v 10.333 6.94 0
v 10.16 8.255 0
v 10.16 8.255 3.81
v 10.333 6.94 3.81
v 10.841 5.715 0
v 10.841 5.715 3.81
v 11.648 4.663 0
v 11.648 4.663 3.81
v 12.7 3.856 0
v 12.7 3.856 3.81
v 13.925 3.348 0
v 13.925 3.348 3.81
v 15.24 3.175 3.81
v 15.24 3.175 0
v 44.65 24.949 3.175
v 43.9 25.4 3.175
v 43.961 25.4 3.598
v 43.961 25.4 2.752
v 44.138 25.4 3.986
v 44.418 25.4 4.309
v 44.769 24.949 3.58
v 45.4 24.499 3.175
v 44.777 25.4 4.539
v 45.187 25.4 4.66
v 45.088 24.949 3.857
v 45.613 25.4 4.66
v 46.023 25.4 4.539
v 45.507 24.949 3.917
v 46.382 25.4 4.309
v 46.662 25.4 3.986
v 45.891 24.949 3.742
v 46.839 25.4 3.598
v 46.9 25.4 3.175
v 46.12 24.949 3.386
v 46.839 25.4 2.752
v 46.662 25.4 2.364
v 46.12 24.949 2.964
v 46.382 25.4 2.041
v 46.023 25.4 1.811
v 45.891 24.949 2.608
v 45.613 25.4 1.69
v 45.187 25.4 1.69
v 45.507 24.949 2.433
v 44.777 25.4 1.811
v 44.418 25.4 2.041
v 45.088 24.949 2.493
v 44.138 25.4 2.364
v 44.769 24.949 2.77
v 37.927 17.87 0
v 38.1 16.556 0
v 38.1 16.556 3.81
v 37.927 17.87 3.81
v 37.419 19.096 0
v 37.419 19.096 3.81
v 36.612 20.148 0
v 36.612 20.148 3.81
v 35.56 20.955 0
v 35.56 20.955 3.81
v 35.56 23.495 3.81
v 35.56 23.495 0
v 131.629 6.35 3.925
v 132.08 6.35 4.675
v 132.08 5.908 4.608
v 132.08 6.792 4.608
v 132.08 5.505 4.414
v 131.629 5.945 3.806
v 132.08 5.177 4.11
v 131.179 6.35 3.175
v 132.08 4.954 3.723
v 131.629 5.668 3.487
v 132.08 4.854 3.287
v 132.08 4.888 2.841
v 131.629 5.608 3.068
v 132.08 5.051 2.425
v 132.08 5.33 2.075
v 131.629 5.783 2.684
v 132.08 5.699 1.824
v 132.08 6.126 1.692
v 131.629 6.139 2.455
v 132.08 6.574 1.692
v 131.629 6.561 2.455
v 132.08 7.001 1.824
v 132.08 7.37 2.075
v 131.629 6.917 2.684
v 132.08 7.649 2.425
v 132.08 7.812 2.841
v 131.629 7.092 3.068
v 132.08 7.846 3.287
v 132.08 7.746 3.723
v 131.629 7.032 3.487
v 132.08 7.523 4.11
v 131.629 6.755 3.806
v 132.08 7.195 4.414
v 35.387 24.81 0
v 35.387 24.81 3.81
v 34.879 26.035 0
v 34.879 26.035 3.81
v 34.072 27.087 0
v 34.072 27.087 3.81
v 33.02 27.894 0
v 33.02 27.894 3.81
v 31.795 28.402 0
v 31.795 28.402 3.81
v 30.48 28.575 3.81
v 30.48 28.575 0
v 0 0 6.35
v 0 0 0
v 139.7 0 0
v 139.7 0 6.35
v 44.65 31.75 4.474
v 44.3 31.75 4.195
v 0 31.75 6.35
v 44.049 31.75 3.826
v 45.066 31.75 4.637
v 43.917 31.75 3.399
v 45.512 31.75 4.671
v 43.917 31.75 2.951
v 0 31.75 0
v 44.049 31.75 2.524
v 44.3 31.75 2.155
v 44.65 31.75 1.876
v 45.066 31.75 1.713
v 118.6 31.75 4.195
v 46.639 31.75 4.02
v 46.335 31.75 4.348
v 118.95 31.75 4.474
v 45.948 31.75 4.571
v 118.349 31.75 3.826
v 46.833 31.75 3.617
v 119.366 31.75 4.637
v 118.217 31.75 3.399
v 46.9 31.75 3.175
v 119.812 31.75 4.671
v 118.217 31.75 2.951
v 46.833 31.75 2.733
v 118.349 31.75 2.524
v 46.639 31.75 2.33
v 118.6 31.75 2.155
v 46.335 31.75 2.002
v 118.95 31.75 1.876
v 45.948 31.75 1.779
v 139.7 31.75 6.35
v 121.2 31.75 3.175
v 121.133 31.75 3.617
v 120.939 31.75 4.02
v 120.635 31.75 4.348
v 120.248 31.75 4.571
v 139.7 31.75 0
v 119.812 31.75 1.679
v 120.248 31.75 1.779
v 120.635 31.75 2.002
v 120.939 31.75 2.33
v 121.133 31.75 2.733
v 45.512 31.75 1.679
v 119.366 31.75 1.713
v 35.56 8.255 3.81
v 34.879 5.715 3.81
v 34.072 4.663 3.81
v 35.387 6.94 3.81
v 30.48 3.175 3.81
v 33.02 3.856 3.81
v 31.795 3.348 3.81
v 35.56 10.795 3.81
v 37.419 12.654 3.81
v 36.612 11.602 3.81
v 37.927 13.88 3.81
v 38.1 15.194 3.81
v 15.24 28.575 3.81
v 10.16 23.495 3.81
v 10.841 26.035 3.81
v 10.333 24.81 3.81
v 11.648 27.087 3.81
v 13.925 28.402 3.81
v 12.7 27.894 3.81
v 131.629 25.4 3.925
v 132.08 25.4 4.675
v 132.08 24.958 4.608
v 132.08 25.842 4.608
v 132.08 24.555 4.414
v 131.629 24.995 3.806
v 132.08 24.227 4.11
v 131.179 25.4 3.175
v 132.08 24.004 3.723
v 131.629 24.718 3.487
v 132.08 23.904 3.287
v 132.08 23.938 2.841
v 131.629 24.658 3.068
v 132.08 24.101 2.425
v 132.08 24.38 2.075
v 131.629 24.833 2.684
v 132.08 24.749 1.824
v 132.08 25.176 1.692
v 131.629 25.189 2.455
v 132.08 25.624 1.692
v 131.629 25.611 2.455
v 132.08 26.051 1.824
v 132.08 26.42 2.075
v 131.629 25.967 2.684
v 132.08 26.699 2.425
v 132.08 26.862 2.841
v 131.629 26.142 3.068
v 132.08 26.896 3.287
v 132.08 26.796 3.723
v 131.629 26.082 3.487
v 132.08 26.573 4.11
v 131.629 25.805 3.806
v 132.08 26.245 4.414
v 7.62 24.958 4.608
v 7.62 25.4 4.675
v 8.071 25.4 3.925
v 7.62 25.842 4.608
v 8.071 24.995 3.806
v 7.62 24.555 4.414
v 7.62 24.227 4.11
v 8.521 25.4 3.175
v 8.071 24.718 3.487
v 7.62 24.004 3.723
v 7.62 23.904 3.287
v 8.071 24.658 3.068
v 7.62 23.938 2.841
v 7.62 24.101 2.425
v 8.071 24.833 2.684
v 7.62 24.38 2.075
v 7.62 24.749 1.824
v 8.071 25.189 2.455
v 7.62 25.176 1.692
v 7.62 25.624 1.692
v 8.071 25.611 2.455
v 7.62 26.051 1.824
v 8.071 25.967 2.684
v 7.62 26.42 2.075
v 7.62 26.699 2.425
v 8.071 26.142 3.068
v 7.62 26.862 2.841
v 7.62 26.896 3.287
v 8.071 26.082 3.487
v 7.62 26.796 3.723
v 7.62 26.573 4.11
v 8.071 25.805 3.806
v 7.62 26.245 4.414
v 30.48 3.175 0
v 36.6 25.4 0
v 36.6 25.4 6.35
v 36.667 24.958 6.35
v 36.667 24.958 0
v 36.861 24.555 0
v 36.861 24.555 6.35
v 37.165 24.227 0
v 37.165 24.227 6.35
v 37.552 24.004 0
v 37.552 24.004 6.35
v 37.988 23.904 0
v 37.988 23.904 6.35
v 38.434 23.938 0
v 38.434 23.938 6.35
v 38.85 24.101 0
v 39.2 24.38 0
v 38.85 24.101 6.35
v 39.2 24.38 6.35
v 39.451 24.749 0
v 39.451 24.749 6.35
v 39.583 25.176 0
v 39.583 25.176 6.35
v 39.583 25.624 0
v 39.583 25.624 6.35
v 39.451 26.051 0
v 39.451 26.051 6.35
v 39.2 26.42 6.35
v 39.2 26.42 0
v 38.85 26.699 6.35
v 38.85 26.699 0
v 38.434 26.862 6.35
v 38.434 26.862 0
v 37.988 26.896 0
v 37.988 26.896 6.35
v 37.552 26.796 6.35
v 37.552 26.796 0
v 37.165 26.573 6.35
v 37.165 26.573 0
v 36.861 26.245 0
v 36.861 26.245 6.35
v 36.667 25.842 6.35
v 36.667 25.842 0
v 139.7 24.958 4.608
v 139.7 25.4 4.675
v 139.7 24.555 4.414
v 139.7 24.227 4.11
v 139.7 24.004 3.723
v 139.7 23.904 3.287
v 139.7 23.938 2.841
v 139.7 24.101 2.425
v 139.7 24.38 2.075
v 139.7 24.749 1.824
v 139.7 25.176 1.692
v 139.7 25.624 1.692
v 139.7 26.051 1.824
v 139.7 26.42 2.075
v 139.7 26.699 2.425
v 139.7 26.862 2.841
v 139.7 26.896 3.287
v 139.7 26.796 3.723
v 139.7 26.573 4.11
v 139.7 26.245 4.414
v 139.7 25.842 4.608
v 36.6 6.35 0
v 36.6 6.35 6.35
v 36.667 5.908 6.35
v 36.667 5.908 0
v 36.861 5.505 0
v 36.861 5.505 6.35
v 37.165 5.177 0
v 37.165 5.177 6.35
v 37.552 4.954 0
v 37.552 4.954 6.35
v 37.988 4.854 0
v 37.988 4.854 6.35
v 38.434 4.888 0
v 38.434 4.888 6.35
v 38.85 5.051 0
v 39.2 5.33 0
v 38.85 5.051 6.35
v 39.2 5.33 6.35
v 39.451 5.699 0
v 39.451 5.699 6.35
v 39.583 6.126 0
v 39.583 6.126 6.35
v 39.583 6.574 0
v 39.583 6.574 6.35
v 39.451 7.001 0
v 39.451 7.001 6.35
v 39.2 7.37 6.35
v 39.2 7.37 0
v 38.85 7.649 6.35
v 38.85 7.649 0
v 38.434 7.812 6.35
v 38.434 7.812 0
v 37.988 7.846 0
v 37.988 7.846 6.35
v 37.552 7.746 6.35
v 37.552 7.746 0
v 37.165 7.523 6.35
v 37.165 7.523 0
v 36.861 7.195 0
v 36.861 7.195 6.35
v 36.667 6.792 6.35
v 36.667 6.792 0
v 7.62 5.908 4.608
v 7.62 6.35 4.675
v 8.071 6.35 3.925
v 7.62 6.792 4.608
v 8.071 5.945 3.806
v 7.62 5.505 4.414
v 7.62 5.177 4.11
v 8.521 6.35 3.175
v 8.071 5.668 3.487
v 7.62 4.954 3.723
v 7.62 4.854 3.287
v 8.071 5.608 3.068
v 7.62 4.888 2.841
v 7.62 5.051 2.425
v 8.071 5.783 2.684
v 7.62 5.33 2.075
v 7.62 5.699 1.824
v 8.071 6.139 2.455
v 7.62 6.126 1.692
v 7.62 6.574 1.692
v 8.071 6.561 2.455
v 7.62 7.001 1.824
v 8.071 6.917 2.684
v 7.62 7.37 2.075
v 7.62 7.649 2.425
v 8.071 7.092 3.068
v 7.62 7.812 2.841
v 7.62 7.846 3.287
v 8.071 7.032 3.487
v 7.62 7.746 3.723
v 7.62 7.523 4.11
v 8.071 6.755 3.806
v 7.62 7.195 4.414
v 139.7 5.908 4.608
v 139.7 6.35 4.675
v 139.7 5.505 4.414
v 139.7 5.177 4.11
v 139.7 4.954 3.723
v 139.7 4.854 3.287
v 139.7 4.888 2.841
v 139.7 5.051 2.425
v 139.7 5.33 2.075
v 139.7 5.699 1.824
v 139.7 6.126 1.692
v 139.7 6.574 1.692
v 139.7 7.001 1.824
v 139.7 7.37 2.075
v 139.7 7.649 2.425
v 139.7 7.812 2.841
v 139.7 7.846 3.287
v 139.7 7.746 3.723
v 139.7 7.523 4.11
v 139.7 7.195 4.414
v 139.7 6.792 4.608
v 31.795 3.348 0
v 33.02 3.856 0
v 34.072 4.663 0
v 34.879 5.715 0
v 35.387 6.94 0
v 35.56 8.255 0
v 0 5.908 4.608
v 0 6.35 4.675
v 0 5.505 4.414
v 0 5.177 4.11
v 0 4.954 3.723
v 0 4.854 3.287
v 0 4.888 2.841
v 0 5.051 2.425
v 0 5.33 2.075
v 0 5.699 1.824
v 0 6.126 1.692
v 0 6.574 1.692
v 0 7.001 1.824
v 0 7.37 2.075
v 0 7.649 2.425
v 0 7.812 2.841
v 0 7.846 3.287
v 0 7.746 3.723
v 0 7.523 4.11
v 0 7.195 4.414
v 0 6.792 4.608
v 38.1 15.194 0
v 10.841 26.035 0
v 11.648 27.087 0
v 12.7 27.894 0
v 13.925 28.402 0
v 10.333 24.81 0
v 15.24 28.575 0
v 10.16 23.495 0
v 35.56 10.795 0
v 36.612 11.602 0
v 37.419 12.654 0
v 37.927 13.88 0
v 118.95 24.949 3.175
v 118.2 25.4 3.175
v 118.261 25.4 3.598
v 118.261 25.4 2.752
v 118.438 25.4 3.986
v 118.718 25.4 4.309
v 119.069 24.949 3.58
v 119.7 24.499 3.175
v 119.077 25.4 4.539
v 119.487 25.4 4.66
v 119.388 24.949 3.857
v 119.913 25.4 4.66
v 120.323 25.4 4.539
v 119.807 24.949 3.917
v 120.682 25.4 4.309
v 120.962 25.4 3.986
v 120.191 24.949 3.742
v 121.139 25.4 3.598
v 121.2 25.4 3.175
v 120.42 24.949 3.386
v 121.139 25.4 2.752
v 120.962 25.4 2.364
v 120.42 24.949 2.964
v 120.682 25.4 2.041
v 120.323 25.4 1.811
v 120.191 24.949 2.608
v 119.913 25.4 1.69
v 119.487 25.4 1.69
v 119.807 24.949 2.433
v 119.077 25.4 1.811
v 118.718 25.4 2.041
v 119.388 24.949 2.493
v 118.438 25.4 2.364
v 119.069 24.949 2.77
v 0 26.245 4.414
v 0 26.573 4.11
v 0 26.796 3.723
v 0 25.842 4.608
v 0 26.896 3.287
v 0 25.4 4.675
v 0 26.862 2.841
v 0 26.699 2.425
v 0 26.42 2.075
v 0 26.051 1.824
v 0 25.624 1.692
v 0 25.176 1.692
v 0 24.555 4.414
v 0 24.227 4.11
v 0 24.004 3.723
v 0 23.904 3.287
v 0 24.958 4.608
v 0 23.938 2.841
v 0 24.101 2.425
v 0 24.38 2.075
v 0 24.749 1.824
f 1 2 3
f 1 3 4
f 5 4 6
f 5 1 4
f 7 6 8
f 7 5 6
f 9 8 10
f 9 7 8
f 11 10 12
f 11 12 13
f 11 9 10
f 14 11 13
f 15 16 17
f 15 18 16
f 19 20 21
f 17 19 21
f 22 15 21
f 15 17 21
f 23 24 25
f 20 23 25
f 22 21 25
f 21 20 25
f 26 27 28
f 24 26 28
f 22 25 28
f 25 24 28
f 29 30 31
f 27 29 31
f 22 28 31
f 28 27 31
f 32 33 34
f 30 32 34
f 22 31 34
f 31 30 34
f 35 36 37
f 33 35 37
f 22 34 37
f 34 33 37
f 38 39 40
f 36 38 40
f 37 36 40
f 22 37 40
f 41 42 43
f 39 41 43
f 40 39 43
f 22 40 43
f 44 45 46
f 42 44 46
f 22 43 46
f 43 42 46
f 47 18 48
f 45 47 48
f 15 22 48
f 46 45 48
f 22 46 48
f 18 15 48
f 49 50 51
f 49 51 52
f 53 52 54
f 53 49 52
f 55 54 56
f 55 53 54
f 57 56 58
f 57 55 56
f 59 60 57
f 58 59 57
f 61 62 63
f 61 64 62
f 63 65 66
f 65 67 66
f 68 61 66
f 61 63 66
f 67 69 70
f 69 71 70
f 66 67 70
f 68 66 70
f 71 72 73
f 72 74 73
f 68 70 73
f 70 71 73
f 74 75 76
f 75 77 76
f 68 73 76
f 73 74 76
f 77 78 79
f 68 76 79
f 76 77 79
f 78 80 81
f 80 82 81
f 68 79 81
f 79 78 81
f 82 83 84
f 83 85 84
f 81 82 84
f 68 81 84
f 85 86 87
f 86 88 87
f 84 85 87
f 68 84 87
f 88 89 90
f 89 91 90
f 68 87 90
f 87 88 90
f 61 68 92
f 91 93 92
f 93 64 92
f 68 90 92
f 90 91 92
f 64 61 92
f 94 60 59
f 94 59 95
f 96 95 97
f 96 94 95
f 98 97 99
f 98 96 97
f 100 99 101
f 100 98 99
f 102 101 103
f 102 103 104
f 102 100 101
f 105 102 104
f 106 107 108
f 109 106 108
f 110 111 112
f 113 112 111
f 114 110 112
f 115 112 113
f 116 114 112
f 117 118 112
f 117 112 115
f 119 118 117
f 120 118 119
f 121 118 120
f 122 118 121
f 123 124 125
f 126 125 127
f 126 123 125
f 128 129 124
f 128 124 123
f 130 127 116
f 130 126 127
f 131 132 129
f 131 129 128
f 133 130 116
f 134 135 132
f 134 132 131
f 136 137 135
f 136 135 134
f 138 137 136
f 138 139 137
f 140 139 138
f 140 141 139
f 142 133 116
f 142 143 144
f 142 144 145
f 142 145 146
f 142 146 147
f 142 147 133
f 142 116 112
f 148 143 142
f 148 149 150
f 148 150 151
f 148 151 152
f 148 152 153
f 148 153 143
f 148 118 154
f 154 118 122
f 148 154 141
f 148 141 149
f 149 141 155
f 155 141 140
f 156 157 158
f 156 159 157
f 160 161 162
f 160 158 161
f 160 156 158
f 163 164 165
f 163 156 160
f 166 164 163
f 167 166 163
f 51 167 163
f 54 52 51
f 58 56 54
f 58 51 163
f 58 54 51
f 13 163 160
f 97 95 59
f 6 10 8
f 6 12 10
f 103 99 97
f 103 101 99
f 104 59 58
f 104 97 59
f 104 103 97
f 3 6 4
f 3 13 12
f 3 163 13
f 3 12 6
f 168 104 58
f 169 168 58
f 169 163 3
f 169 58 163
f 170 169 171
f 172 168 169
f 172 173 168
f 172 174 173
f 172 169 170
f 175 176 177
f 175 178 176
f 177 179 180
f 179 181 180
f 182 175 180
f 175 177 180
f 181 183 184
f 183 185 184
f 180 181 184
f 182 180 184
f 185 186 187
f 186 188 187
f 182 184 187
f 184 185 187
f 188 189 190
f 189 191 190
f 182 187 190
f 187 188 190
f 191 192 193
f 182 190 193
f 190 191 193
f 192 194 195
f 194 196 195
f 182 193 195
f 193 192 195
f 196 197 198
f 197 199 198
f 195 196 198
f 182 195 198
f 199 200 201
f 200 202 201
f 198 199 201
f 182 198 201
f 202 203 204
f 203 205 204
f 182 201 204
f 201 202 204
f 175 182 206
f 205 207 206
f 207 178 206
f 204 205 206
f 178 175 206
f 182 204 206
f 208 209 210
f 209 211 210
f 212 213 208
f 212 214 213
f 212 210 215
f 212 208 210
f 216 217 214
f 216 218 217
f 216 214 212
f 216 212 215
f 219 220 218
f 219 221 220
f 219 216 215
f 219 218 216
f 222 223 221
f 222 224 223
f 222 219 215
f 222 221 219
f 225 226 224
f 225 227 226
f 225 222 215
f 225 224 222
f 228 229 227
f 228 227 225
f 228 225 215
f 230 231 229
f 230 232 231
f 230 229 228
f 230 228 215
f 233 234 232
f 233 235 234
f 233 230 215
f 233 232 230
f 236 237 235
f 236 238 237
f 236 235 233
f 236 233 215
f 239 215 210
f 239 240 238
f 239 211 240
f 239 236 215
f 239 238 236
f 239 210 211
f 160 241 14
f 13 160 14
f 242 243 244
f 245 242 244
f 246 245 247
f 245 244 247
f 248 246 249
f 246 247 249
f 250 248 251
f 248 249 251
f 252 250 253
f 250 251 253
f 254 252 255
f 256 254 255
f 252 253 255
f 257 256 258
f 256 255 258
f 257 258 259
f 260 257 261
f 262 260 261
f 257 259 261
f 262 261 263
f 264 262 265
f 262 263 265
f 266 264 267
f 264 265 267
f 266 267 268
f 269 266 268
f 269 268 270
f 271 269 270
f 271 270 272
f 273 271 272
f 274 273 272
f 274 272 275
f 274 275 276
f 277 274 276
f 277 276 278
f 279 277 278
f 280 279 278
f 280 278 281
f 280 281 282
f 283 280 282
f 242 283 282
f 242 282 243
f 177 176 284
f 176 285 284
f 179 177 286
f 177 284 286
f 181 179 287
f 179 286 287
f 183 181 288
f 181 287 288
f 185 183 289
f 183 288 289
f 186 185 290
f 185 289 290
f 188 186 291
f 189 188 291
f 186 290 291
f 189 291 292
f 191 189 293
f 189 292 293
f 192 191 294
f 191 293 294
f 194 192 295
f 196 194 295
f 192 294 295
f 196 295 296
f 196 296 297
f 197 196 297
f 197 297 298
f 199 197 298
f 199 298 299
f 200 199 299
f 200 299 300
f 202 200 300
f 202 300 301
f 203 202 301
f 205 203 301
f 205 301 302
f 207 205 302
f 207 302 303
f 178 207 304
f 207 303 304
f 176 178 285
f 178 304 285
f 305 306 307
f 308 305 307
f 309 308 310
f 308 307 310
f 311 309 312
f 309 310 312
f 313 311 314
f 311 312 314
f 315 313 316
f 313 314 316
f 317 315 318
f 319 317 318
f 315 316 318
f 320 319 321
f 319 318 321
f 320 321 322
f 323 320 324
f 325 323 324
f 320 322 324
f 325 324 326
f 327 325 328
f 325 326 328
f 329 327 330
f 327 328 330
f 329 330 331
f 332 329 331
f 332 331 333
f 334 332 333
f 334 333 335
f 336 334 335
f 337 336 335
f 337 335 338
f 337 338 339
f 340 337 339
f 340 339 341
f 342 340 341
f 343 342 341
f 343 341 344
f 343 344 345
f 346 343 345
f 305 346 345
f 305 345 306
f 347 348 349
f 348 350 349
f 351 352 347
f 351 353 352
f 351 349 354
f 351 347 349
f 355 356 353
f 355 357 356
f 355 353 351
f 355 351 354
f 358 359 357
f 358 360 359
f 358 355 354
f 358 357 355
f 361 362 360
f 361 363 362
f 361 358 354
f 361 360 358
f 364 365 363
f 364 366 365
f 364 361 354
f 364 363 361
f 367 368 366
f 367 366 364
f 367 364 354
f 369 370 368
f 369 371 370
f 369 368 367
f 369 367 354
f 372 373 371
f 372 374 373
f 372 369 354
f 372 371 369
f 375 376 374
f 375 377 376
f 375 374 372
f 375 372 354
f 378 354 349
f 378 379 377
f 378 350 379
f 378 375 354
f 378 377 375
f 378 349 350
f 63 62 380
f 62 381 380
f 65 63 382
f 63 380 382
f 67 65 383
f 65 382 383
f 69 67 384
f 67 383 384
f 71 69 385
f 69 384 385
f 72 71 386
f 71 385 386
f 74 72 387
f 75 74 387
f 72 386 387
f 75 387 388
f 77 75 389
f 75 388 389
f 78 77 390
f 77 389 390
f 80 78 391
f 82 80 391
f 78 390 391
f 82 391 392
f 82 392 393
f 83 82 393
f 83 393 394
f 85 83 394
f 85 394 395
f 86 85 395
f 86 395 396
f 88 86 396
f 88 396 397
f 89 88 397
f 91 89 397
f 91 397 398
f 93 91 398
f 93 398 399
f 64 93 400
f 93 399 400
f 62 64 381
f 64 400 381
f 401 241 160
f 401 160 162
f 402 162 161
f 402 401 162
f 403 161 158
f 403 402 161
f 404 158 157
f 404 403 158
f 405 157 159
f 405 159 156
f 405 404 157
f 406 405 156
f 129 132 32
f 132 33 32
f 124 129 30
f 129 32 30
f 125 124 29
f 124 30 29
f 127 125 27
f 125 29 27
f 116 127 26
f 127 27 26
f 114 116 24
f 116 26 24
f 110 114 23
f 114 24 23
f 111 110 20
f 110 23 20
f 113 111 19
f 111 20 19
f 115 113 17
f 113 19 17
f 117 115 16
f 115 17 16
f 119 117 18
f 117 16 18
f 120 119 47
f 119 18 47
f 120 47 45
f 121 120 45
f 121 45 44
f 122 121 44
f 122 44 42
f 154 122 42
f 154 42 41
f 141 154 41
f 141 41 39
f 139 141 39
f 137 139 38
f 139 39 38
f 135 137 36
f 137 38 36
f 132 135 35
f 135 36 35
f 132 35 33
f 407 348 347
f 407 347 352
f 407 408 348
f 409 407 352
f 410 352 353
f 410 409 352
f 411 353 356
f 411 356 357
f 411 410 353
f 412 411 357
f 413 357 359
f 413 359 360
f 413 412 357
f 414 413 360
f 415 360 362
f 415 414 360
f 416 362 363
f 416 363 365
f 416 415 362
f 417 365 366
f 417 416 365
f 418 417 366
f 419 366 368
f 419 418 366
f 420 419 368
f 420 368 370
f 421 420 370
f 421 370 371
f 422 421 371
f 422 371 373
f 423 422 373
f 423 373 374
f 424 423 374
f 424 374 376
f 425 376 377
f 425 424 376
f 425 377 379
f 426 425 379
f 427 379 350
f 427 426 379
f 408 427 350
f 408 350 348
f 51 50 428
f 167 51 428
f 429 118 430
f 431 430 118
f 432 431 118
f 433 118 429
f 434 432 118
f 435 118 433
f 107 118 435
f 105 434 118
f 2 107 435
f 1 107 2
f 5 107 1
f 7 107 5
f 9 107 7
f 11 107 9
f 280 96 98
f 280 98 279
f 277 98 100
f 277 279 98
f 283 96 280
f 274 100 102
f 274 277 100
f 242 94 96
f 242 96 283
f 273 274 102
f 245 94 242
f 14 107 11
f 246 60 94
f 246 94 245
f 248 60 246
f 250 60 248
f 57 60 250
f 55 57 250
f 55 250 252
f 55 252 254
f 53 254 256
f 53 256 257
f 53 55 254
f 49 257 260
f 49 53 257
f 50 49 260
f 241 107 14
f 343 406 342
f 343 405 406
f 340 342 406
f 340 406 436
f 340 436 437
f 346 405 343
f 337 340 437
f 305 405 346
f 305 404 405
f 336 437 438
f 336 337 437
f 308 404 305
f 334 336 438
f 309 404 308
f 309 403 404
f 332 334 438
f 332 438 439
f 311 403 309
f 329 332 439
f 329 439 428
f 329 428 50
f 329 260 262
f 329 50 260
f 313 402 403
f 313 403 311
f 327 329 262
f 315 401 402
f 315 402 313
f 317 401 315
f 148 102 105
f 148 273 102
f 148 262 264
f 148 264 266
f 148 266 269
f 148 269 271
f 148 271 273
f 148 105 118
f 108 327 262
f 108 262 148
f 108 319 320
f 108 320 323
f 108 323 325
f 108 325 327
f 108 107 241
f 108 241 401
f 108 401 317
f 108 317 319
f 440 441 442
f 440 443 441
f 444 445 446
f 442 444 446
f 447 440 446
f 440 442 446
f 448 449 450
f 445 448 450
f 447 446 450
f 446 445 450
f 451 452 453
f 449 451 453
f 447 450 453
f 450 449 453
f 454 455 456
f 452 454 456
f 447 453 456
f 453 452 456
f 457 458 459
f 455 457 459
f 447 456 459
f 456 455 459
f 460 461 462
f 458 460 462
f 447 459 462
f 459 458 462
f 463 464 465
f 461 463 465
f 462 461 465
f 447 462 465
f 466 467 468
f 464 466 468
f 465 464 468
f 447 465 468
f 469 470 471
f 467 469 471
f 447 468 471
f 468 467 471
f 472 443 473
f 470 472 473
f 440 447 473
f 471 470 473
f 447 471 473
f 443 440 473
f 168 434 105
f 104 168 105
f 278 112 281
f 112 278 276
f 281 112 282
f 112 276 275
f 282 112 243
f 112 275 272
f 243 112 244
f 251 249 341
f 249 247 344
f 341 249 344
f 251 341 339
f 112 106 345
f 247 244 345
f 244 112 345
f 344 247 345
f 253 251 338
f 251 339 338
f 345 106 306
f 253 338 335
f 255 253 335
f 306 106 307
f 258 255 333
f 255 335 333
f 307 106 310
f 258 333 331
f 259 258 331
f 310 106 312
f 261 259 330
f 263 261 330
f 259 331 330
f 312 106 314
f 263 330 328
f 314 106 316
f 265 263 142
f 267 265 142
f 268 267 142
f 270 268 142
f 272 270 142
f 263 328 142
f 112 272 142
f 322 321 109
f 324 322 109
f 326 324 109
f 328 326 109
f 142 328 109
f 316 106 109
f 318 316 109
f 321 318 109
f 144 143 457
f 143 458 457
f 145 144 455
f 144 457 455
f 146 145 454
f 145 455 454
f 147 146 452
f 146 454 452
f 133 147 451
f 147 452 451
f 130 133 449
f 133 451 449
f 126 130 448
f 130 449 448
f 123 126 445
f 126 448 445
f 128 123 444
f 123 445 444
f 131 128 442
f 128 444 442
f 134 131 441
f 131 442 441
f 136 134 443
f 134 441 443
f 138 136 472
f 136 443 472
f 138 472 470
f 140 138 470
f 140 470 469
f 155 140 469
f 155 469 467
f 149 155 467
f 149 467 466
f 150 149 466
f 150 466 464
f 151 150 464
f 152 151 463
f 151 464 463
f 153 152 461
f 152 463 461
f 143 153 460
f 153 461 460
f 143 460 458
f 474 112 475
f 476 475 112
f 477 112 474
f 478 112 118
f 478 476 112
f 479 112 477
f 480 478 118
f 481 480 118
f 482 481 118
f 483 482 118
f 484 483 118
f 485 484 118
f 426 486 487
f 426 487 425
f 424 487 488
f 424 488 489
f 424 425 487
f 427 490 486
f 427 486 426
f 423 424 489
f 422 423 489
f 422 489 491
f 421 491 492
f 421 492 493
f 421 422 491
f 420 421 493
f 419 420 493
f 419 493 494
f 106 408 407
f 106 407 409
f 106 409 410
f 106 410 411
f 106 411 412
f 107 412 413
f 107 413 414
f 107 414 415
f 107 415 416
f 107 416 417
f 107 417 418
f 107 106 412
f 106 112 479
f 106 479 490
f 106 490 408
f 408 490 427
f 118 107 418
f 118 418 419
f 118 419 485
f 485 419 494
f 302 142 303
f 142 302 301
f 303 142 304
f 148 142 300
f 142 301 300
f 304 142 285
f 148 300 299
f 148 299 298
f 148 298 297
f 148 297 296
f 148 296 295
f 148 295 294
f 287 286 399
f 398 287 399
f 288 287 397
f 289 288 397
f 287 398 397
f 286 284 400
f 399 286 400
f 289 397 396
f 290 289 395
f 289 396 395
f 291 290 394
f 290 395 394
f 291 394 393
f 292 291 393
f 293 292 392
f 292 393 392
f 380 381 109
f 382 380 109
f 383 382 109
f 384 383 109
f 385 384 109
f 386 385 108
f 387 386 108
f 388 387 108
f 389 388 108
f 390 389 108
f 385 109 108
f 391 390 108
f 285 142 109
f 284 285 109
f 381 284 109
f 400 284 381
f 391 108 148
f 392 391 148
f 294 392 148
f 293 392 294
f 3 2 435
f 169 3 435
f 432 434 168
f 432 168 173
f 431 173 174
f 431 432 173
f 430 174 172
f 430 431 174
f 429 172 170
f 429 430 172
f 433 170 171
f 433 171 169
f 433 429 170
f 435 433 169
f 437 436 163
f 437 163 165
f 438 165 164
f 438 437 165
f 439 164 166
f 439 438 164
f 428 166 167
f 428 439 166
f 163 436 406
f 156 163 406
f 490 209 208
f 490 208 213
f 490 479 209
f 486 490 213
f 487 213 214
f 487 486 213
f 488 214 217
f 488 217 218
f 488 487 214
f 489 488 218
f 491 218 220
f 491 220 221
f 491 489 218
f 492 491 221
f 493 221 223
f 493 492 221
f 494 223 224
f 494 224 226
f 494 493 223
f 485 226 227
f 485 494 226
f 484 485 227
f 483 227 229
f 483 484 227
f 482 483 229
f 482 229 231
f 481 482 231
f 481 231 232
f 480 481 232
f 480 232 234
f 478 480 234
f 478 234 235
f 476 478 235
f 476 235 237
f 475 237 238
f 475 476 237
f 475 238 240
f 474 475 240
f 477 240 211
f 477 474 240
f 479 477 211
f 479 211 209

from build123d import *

# Parameters (mm, degrees)
TOP_PROFILE_W                  = 139.7
TOP_PROFILE_H                  = 6.35
WALL_MID_DEPTH                 = 31.75
F_3_0MM_DOWEL_HOLE1_D          = 3
MOTOR_INTERFERECNE_DEPTH       = 3.81
FILLET2_R                      = 5.08
F_3_0MM_DOWEL_HOLE2_AT_2_COUNT = 2
F_3_0MM_DOWEL_HOLE2_AT_2_PITCH = 19.05
F_3_0MM_DOWEL_HOLE4_D          = 3
F_3_0MM_DOWEL_HOLE4_DEPTH      = 6.35
F_3_0MM_DOWEL_HOLE4_TIP        = 0.901290929


with BuildPart() as part:
    # top profile → wall mid (new body)
    with BuildSketch(Plane(origin=(0, 0, 0), x_dir=(1, 0, 0), z_dir=(0, 1, 0))):
        with Locations((69.85, -3.175)):
            Rectangle(TOP_PROFILE_W, TOP_PROFILE_H)
    extrude(amount=WALL_MID_DEPTH)

    # Ø3.0mm Dowel Hole1 (through all)
    with Locations(Plane(origin=(0, 0, 0), x_dir=(1, 0, 0), z_dir=(0, 0, -1))):
        with Locations((38.1, -6.35), (38.1, -25.4)):
            Hole(F_3_0MM_DOWEL_HOLE1_D / 2)

    # Sketch8 → motor interferecne (cut)
    with BuildSketch(Plane.XY):
        Polygon((10.16, 28.575), (35.56, 28.575), (35.56, 20.955), (38.1, 20.955), (38.1, 10.795), (35.56, 10.795), (35.56, 3.175), (10.16, 3.175), align=None)
    extrude(amount=MOTOR_INTERFERECNE_DEPTH, mode=Mode.SUBTRACT)

    # Fillet2
    # the kernel refuses this fillet: 5.08 mm, written as the material it adds along each edge
    with BuildSketch(Plane(origin=(10.16, 3.175, 0), x_dir=(1, 0, 0), z_dir=(0, 0, 1)), Plane(origin=(35.56, 3.175, 0), x_dir=(0, 1, 0), z_dir=(0, 0, 1)), Plane(origin=(35.56, 28.575, 0), x_dir=(-1, 0, 0), z_dir=(0, 0, 1))) as fillet2_piece_1:
        with BuildLine():
            CenterArc((FILLET2_R, FILLET2_R), FILLET2_R, 180, 90)
            Line((0, FILLET2_R), (-FILLET2_R * 0.02, FILLET2_R))
            Line((-FILLET2_R * 0.02, FILLET2_R), (-FILLET2_R * 0.02, -FILLET2_R * 0.02))
            Line((-FILLET2_R * 0.02, -FILLET2_R * 0.02), (FILLET2_R, -FILLET2_R * 0.02))
            Line((FILLET2_R, -FILLET2_R * 0.02), (FILLET2_R, 0))
        make_face()
    extrude(amount=3.81)
    with BuildSketch(Plane(origin=(10.16, 28.575, 0), x_dir=(1, 0, 0), z_dir=(0, 0, 1))) as fillet2_piece_2:
        with BuildLine():
            CenterArc((FILLET2_R, -FILLET2_R), FILLET2_R, 90, 90)
            Line((0, -FILLET2_R), (-FILLET2_R * 0.02, -FILLET2_R))
            Line((-FILLET2_R * 0.02, -FILLET2_R), (-FILLET2_R * 0.02, FILLET2_R * 0.02))
            Line((-FILLET2_R * 0.02, FILLET2_R * 0.02), (FILLET2_R, FILLET2_R * 0.02))
            Line((FILLET2_R, FILLET2_R * 0.02), (FILLET2_R, 0))
        make_face()
    extrude(amount=3.81)
    with BuildSketch(Plane(origin=(38.1, 10.795, 0), x_dir=(0, 1, 0), z_dir=(0, 0, 1))) as fillet2_piece_3:
        with BuildLine():
            CenterArc((4.399409051, 5.08), FILLET2_R, 210, 60)
            Line((0, 2.54), (-0.087988181, 2.4892))
            ThreePointArc((-0.087988181, 2.4892), (-0.1016, 1.27), (-0.1016, 0))
            Line((-0.1016, 0), (0, -0.1016))
            Line((0, -0.1016), (4.399409051, -0.1016))
            Line((4.399409051, -0.1016), (4.399409051, 0))
        make_face()
    extrude(amount=3.81)
    with BuildSketch(Plane(origin=(38.1, 20.955, 0), x_dir=(-1, 0, 0), z_dir=(0, 0, 1))) as fillet2_piece_4:
        with BuildLine():
            CenterArc((5.08, 4.399409051), FILLET2_R, 180, 60)
            Line((0, 4.399409051), (-0.1016, 4.399409051))
            Line((-0.1016, 4.399409051), (-0.1016, 0))
            Line((-0.1016, 0), (0, -0.1016))
            ThreePointArc((0, -0.1016), (1.27, -0.1016), (2.4892, -0.087988181))
            Line((2.4892, -0.087988181), (2.54, 0))
        make_face()
    extrude(amount=3.81)

    # Sketch13 → Ø3.0mm Dowel Hole2 (revolve, cut)
    with BuildSketch(Plane(origin=(0, 25.4, 3.175), x_dir=(0, 0, 1), z_dir=(0, 1, 0))):
        Polygon((0, 0), (0, 8.521290929), (1.5, 7.62), (1.5, 0), align=None)
    f_3_0mm_dowel_hole2 = revolve(axis=Axis((-6.35, 25.4, 3.175), (1, 0, 0)), mode=Mode.SUBTRACT)

    # Ø3.0mm Dowel Hole2 at 2: Ø3.0mm Dowel Hole2 ×2
    with Locations(*[(0, -i * F_3_0MM_DOWEL_HOLE2_AT_2_PITCH, 0) for i in range(1, F_3_0MM_DOWEL_HOLE2_AT_2_COUNT)]):
        add(f_3_0mm_dowel_hole2, mode=Mode.SUBTRACT)

    # Mirror1: Ø3.0mm Dowel Hole2 across plane
    add(f_3_0mm_dowel_hole2.mirror(Plane.ZY.offset(-69.85)), mode=Mode.SUBTRACT)

    # Mirror1 copy 1 sketch → Mirror1 copy 1 (revolve, cut)
    with BuildSketch(Plane(origin=(139.7, 6.35, 3.175), x_dir=(0, 0, 1), z_dir=(0, 1, 0))):
        Polygon((0, 0), (0, -8.521290929), (1.5, -7.62), (1.5, 0), align=None)
    revolve(axis=Axis((146.05, 6.35, 3.175), (1, 0, 0)), mode=Mode.SUBTRACT)

    # Ø3.0mm Dowel Hole4
    with Locations(Plane(origin=(146.05, 31.75, -25.4), x_dir=(-1, 0, 0), z_dir=(0, 1, 0))):
        with Locations((26.35, 28.575), (100.65, 28.575)):
            Hole(F_3_0MM_DOWEL_HOLE4_D / 2, depth=F_3_0MM_DOWEL_HOLE4_DEPTH)
            with Locations((0, 0, -(F_3_0MM_DOWEL_HOLE4_DEPTH + F_3_0MM_DOWEL_HOLE4_TIP / 2))):  # 118° drill point
                Cone(0, F_3_0MM_DOWEL_HOLE4_D / 2, F_3_0MM_DOWEL_HOLE4_TIP, mode=Mode.SUBTRACT)


solid = part.part
